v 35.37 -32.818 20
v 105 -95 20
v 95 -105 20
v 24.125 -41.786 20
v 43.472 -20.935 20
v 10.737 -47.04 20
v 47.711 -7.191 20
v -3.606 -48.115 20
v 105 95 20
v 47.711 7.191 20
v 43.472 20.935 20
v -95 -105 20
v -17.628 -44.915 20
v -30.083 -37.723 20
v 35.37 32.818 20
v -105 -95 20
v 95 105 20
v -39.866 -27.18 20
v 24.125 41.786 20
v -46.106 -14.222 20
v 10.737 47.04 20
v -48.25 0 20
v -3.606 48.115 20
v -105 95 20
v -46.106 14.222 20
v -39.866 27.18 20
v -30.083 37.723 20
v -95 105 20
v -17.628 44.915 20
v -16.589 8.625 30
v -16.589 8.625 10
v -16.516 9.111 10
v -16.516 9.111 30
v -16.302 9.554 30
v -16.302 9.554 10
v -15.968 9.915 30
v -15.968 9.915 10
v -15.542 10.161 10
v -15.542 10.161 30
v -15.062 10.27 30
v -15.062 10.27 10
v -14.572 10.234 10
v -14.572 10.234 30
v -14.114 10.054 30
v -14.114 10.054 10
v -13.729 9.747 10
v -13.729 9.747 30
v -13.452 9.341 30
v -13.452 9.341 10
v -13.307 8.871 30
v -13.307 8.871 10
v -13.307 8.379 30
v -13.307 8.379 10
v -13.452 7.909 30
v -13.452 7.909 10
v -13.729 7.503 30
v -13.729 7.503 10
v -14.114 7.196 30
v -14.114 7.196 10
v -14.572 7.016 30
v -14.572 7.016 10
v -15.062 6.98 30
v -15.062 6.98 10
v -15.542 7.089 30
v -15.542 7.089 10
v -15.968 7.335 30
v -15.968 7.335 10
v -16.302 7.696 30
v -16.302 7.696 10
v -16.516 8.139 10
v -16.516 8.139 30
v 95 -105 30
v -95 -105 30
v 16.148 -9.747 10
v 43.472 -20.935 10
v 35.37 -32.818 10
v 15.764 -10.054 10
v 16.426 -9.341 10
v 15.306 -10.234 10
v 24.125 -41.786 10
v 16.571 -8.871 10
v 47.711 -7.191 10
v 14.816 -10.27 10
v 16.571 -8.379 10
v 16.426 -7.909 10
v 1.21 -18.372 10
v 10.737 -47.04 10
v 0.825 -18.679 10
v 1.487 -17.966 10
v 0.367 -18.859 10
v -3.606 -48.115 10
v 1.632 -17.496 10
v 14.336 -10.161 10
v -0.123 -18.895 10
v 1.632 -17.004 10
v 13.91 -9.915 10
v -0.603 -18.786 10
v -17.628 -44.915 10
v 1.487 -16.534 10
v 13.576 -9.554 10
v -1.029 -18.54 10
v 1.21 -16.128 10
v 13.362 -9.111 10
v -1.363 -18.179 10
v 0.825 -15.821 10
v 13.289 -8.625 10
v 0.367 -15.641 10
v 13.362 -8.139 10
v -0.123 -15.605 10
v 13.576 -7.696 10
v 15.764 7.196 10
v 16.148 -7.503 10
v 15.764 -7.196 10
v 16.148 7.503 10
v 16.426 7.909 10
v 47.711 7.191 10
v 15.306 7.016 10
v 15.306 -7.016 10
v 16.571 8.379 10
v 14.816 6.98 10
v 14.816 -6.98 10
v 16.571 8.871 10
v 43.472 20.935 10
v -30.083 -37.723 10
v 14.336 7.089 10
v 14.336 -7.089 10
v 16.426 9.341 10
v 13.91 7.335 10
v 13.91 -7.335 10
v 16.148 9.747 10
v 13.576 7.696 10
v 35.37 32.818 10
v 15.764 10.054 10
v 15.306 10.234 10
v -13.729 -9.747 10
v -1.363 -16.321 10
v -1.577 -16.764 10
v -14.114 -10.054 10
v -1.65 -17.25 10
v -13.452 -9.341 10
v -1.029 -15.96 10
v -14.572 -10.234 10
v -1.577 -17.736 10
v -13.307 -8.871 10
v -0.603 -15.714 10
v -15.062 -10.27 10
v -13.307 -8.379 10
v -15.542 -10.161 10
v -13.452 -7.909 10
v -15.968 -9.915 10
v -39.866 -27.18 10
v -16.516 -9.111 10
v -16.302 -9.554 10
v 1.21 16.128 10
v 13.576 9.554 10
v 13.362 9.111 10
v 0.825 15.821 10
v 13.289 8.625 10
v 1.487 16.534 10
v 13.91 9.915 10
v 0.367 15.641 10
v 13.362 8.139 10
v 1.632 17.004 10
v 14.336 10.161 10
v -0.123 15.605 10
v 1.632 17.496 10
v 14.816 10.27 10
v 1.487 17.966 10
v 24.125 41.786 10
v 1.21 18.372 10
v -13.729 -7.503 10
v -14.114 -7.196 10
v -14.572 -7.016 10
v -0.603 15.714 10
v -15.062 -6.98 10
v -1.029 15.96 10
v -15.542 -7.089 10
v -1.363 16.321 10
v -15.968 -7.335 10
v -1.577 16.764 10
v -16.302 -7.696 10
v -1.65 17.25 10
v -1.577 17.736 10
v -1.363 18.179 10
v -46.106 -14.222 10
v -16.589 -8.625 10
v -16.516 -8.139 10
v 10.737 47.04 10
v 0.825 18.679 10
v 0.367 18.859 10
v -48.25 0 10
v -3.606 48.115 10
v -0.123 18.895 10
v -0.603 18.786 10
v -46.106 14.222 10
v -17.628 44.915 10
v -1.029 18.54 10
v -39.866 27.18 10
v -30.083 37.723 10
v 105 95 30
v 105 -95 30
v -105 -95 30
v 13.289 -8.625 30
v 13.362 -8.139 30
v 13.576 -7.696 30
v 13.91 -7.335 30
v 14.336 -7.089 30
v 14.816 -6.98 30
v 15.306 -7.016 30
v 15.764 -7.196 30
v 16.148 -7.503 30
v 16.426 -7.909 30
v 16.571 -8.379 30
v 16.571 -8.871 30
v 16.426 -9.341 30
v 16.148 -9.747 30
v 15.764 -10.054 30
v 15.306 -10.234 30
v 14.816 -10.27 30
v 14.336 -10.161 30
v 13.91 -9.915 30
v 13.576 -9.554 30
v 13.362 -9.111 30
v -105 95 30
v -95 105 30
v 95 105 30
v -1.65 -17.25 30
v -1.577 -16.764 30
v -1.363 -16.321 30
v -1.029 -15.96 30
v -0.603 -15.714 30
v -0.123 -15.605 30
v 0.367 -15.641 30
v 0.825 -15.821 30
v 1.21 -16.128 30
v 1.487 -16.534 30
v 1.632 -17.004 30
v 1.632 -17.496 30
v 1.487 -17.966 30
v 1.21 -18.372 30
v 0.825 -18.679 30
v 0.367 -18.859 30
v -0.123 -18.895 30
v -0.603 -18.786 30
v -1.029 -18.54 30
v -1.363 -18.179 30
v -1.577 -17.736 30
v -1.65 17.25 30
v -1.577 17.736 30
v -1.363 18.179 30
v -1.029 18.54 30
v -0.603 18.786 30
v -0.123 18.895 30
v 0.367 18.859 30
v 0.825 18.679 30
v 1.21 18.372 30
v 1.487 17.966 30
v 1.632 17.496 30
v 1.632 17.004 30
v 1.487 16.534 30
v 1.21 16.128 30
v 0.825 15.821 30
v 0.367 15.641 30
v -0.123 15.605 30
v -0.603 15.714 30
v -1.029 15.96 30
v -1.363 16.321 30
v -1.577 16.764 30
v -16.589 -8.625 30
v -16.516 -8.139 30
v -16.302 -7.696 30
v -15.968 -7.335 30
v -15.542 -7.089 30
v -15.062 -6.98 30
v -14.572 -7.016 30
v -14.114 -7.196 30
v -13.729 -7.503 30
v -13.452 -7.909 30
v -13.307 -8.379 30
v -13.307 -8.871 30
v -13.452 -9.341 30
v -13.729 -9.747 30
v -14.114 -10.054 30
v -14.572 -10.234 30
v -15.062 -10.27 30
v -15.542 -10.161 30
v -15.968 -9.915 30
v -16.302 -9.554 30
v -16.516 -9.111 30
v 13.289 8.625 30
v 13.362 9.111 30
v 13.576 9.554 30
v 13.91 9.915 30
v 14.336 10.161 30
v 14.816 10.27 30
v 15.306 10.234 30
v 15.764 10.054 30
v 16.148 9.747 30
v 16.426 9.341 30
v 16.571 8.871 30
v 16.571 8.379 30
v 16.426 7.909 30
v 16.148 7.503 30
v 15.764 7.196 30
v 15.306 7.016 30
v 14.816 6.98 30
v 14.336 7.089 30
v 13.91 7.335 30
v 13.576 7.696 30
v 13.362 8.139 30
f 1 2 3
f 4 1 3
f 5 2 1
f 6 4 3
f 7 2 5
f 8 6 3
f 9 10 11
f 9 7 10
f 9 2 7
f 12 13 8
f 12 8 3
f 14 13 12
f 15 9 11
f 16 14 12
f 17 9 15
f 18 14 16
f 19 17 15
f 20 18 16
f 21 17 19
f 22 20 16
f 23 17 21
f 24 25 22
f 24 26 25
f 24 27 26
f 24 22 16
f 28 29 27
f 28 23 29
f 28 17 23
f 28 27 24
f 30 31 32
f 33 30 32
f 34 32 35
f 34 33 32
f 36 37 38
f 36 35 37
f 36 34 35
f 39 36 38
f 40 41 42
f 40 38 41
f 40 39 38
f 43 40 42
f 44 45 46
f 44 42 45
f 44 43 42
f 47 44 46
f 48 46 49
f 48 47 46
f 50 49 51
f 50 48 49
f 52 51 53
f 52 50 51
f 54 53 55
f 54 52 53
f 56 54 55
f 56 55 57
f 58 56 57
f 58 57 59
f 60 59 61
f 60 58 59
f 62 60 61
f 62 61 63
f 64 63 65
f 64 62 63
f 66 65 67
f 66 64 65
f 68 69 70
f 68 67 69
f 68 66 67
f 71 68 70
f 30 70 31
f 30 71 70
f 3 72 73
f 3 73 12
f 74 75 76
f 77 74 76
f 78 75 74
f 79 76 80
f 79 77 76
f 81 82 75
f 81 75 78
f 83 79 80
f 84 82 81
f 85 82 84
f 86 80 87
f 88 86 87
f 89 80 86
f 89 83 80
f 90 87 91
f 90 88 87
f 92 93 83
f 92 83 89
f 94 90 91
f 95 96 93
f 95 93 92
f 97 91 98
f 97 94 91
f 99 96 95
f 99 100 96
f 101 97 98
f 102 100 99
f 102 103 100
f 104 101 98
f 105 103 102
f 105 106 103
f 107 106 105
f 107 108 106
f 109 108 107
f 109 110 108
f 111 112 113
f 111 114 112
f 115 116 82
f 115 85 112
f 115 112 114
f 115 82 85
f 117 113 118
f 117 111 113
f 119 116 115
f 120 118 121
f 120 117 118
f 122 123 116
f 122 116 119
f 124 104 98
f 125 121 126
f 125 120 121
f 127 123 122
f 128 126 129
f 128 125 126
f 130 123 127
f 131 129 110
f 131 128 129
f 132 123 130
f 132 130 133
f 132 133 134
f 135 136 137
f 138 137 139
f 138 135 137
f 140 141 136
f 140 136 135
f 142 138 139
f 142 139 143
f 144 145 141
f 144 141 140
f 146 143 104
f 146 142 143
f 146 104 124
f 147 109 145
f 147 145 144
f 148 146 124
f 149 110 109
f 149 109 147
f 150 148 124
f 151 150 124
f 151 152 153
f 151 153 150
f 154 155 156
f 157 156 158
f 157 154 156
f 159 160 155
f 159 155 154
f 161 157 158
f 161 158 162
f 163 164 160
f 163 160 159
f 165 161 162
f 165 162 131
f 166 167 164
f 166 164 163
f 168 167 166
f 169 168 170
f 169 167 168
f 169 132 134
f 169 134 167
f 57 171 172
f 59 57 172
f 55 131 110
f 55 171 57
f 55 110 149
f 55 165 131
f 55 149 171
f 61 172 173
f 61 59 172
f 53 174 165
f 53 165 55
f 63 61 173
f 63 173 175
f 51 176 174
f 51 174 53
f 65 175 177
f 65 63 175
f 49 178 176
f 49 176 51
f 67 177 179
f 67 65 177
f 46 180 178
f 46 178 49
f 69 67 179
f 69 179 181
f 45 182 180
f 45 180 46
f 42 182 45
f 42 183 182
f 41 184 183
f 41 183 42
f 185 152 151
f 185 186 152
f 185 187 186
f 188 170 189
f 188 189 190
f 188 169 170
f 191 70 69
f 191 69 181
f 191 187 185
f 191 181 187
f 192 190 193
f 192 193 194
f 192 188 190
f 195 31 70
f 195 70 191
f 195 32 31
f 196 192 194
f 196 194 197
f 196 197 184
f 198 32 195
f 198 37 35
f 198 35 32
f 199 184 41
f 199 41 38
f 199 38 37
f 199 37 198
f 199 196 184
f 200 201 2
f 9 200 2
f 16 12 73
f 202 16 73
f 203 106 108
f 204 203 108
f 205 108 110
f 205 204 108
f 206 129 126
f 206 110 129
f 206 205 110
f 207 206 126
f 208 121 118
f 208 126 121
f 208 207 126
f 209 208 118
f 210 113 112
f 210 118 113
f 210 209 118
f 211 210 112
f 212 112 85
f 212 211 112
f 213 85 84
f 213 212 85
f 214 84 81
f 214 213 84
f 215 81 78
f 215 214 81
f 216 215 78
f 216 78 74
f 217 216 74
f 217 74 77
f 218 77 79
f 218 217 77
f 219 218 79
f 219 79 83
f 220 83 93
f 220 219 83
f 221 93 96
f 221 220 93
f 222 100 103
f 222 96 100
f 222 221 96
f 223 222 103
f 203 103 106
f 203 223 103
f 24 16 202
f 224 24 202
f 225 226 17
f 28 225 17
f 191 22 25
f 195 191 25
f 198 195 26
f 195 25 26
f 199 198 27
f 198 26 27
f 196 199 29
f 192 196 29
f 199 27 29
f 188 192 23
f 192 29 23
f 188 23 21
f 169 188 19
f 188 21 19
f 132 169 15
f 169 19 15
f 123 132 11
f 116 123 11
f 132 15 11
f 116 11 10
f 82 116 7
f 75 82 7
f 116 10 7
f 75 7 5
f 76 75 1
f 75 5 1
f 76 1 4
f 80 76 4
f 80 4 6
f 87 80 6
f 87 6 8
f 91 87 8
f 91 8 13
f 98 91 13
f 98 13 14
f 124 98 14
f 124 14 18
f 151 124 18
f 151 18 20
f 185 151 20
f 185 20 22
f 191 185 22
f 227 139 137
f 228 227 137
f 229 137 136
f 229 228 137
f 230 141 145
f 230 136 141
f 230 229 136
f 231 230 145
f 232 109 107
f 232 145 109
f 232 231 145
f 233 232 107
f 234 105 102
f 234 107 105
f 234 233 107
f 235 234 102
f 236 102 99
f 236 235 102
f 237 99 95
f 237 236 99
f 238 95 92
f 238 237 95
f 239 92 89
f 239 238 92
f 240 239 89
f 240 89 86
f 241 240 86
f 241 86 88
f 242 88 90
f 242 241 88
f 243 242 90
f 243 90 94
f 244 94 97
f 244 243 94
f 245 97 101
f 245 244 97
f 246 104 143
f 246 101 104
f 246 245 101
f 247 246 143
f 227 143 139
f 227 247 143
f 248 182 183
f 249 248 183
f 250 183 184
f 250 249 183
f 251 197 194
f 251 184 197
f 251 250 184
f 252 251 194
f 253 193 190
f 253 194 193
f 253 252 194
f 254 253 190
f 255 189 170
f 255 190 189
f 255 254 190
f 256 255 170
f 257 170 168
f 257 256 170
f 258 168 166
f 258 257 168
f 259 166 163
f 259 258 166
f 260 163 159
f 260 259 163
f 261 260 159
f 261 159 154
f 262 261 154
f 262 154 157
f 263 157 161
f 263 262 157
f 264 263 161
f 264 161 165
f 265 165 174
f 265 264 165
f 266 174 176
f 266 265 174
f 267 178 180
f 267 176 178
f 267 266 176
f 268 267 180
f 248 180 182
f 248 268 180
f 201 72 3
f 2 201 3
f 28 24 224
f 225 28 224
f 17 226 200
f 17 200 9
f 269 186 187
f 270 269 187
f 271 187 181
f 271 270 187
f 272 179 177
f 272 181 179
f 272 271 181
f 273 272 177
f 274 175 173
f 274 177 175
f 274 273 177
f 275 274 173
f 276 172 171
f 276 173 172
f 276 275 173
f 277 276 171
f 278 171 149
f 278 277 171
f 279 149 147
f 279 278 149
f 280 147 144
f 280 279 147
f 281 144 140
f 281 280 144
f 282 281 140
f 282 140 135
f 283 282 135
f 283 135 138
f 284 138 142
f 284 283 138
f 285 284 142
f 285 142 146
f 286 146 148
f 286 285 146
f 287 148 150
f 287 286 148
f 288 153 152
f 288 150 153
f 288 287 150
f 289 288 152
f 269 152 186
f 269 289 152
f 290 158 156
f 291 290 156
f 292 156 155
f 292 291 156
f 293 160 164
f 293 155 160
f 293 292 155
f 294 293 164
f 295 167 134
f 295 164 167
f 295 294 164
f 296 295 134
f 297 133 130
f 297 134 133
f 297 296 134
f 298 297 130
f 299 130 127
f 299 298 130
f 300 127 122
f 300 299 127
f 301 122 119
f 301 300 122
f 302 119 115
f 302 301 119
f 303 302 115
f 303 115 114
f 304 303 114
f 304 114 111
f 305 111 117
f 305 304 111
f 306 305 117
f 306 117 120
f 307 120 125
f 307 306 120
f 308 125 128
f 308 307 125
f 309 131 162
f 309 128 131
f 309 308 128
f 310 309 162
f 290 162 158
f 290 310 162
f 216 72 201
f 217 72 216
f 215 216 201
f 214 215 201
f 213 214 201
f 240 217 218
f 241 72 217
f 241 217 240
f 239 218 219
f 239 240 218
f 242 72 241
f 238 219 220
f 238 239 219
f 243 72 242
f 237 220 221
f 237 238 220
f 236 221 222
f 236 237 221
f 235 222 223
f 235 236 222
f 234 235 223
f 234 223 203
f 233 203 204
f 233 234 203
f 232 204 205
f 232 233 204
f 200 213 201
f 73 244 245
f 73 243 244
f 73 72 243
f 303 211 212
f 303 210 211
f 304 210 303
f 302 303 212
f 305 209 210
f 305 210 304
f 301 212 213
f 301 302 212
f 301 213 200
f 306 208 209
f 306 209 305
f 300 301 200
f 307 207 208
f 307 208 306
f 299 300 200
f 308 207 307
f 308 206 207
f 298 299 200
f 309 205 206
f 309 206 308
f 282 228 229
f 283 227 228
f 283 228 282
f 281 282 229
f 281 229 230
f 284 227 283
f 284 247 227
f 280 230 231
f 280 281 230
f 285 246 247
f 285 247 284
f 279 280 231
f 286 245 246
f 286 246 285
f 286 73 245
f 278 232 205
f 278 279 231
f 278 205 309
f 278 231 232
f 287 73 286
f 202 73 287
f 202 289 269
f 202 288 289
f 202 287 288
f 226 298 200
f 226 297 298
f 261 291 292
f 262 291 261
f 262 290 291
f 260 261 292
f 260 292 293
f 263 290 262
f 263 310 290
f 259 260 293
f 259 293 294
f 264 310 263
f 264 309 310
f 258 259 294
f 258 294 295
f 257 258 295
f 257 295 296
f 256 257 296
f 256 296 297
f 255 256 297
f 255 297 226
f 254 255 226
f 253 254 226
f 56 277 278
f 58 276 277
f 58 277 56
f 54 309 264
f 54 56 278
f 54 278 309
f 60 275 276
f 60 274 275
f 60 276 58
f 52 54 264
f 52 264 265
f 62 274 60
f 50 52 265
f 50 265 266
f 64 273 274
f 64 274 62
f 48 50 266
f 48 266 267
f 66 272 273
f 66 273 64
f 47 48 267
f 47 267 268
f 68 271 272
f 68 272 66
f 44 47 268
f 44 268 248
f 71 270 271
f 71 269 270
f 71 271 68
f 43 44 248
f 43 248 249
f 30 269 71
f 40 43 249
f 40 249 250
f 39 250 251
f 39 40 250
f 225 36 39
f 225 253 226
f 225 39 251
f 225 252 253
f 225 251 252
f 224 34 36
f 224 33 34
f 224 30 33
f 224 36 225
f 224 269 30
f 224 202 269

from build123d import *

# Parameters (mm, degrees)
SKETCH_1_W               = 150
SKETCH_1_H               = 150
EXTRUDE_1_DEPTH          = 30
SKETCH_2_R               = 48.25
EXTRUDE_2_DEPTH          = 10
SKETCH_3_R               = 1.65
EXTRUDE_3_DEPTH          = 8.3
SKETCH_4_W               = 150
SKETCH_4_H               = 30
EXTRUDE_4_DEPTH          = 30
SKETCH_5_W               = 30
SKETCH_5_H               = 180
EXTRUDE_5_DEPTH          = 30
SKETCH_6_W               = 180
SKETCH_6_H               = 30
EXTRUDE_6_DEPTH          = 30
SKETCH_7_W               = 30
SKETCH_7_H               = 210
EXTRUDE_7_DEPTH          = 30
CHAMFER_1_SIZE           = 10
CUT_EXTRUDE_1_DEPTH      = 154.785564992
CUT_EXTRUDE_1_DEPTH_BACK = 154.785564992
SKETCH_8_R               = 1.65
CUT_EXTRUDE_START        = -15
SKETCH_9_R               = 48.25
CUT_EXTRUDE_2_DEPTH      = 15
SKETCH_10_R              = 48.25
CUT_EXTRUDE_3_DEPTH      = 15
CUT_EXTRUDE_START_2      = -5
SKETCH_11_R              = 48.25
CUT_EXTRUDE_4_DEPTH      = 5
SKETCH_12_R              = 48.25
CUT_EXTRUDE_5_DEPTH      = 5


with BuildPart() as part:
    # 草图1 → 凸台-拉伸1 (new body)
    with BuildSketch(Plane.XY):
        Rectangle(SKETCH_1_W, SKETCH_1_H)
    extrude(amount=EXTRUDE_1_DEPTH)

    # 草图2 → 凸台-拉伸2 (add)
    with BuildSketch(Plane(origin=(0, 0, 0), x_dir=(-1, 0, 0), z_dir=(0, 0, -1))):
        Circle(SKETCH_2_R)
    extrude(amount=EXTRUDE_2_DEPTH)

    # 草图3 → 凸台-拉伸3 (add)
    with BuildSketch(Plane(origin=(0, 0, -10), x_dir=(-1, 0, 0), z_dir=(0, 0, -1))):
        with Locations(Location((0, 17.25, 0), (0, 0, 180))):
            Circle(SKETCH_3_R)
        with Locations(Location((14.938938215, 8.625, 0), (0, 0, 180))):
            Circle(SKETCH_3_R)
        with Locations(Location((14.938938215, -8.625, 0), (0, 0, 180))):
            Circle(SKETCH_3_R)
        with Locations(Location((0, -17.25, 0), (0, 0, 180))):
            Circle(SKETCH_3_R)
        with Locations(Location((-14.938938215, -8.625, 0), (0, 0, 180))):
            Circle(SKETCH_3_R)
        with Locations(Location((-14.938938215, 8.625, 0), (0, 0, 180))):
            Circle(SKETCH_3_R)
    extrude(amount=EXTRUDE_3_DEPTH)

    # 草图4 → 凸台-拉伸4 (add)
    with BuildSketch(Plane(origin=(0, 75, 0), x_dir=(1, 0, 0), z_dir=(0, 1, 0))):
        with Locations((0, -15)):
            Rectangle(SKETCH_4_W, SKETCH_4_H)
    extrude(amount=EXTRUDE_4_DEPTH)

    # 草图5 → 凸台-拉伸5 (add)
    with BuildSketch(Plane.ZY.offset(75)):
        with Locations((15, 15)):
            Rectangle(SKETCH_5_W, SKETCH_5_H)
    extrude(amount=EXTRUDE_5_DEPTH)

    # 草图6 → 凸台-拉伸6 (add)
    with BuildSketch(Plane.XZ.offset(75)):
        with Locations((-15, 15)):
            Rectangle(SKETCH_6_W, SKETCH_6_H)
    extrude(amount=EXTRUDE_6_DEPTH)

    # 草图7 → 凸台-拉伸7 (add)
    with BuildSketch(Plane(origin=(75, 0, 0), x_dir=(0, 0, -1), z_dir=(1, 0, 0))):
        with Locations((-15, 0)):
            Rectangle(SKETCH_7_W, SKETCH_7_H)
    extrude(amount=EXTRUDE_7_DEPTH)

    # 倒角1
    chamfer_1_edges = [part.edges().sort_by_distance(p)[0] for p in [
        (-105, 105, 15),
        (-105, -105, 15),
        (105, -105, 15),
        (105, 105, 15),
    ]]
    chamfer(chamfer_1_edges, length=CHAMFER_1_SIZE)

    # 草图8 → 切除-拉伸1 (cut, two sides: drawn at the far end of the back side and taken through both)
    with BuildSketch(Plane(origin=(0, 0, -10), x_dir=(-1, 0, 0), z_dir=(0, 0, -1)).offset(-CUT_EXTRUDE_1_DEPTH_BACK)):
        with Locations((-14.938938215, -8.625)):
            Circle(SKETCH_8_R)
        with Locations((0, -17.25)):
            Circle(SKETCH_8_R)
        with Locations((14.938938215, -8.625)):
            Circle(SKETCH_8_R)
        with Locations((14.938938215, 8.625)):
            Circle(SKETCH_8_R)
        with Locations((0, 17.25)):
            Circle(SKETCH_8_R)
        with Locations((-14.938938215, 8.625)):
            Circle(SKETCH_8_R)
    extrude(amount=CUT_EXTRUDE_1_DEPTH + CUT_EXTRUDE_1_DEPTH_BACK, mode=Mode.SUBTRACT)

    # 草图9 → 切除-拉伸2 (cut)
    with BuildSketch(Plane(origin=(0, 0, 0), x_dir=(-1, 0, 0), z_dir=(0, 0, -1)).offset(CUT_EXTRUDE_START)):
        Polygon((-95, -105), (95, -105), (105, -95), (105, 95), (95, 105), (-95, 105), (-105, 95), (-105, -95), align=None)
        Circle(SKETCH_9_R, mode=Mode.SUBTRACT)
    extrude(amount=CUT_EXTRUDE_2_DEPTH, mode=Mode.SUBTRACT)

    # 草图10 → 切除-拉伸3 (cut)
    with BuildSketch(Plane(origin=(0, 0, -10), x_dir=(-1, 0, 0), z_dir=(0, 0, -1)).offset(CUT_EXTRUDE_START)):
        Circle(SKETCH_10_R)
    extrude(amount=CUT_EXTRUDE_3_DEPTH, mode=Mode.SUBTRACT)

    # 草图11 → 切除-拉伸4 (cut)
    with BuildSketch(Plane(origin=(0, 0, 5), x_dir=(-1, 0, 0), z_dir=(0, 0, -1)).offset(CUT_EXTRUDE_START_2)):
        Circle(SKETCH_11_R)
    extrude(amount=CUT_EXTRUDE_4_DEPTH, mode=Mode.SUBTRACT)

    # 草图12 → 切除-拉伸5 (cut)
    with BuildSketch(Plane(origin=(0, 0, 15), x_dir=(-1, 0, 0), z_dir=(0, 0, -1)).offset(CUT_EXTRUDE_START_2)):
        Polygon((-105, -95), (-95, -105), (95, -105), (105, -95), (105, 95), (95, 105), (-95, 105), (-105, 95), align=None)
        Circle(SKETCH_12_R, mode=Mode.SUBTRACT)
    extrude(amount=CUT_EXTRUDE_5_DEPTH, mode=Mode.SUBTRACT)


solid = part.part
